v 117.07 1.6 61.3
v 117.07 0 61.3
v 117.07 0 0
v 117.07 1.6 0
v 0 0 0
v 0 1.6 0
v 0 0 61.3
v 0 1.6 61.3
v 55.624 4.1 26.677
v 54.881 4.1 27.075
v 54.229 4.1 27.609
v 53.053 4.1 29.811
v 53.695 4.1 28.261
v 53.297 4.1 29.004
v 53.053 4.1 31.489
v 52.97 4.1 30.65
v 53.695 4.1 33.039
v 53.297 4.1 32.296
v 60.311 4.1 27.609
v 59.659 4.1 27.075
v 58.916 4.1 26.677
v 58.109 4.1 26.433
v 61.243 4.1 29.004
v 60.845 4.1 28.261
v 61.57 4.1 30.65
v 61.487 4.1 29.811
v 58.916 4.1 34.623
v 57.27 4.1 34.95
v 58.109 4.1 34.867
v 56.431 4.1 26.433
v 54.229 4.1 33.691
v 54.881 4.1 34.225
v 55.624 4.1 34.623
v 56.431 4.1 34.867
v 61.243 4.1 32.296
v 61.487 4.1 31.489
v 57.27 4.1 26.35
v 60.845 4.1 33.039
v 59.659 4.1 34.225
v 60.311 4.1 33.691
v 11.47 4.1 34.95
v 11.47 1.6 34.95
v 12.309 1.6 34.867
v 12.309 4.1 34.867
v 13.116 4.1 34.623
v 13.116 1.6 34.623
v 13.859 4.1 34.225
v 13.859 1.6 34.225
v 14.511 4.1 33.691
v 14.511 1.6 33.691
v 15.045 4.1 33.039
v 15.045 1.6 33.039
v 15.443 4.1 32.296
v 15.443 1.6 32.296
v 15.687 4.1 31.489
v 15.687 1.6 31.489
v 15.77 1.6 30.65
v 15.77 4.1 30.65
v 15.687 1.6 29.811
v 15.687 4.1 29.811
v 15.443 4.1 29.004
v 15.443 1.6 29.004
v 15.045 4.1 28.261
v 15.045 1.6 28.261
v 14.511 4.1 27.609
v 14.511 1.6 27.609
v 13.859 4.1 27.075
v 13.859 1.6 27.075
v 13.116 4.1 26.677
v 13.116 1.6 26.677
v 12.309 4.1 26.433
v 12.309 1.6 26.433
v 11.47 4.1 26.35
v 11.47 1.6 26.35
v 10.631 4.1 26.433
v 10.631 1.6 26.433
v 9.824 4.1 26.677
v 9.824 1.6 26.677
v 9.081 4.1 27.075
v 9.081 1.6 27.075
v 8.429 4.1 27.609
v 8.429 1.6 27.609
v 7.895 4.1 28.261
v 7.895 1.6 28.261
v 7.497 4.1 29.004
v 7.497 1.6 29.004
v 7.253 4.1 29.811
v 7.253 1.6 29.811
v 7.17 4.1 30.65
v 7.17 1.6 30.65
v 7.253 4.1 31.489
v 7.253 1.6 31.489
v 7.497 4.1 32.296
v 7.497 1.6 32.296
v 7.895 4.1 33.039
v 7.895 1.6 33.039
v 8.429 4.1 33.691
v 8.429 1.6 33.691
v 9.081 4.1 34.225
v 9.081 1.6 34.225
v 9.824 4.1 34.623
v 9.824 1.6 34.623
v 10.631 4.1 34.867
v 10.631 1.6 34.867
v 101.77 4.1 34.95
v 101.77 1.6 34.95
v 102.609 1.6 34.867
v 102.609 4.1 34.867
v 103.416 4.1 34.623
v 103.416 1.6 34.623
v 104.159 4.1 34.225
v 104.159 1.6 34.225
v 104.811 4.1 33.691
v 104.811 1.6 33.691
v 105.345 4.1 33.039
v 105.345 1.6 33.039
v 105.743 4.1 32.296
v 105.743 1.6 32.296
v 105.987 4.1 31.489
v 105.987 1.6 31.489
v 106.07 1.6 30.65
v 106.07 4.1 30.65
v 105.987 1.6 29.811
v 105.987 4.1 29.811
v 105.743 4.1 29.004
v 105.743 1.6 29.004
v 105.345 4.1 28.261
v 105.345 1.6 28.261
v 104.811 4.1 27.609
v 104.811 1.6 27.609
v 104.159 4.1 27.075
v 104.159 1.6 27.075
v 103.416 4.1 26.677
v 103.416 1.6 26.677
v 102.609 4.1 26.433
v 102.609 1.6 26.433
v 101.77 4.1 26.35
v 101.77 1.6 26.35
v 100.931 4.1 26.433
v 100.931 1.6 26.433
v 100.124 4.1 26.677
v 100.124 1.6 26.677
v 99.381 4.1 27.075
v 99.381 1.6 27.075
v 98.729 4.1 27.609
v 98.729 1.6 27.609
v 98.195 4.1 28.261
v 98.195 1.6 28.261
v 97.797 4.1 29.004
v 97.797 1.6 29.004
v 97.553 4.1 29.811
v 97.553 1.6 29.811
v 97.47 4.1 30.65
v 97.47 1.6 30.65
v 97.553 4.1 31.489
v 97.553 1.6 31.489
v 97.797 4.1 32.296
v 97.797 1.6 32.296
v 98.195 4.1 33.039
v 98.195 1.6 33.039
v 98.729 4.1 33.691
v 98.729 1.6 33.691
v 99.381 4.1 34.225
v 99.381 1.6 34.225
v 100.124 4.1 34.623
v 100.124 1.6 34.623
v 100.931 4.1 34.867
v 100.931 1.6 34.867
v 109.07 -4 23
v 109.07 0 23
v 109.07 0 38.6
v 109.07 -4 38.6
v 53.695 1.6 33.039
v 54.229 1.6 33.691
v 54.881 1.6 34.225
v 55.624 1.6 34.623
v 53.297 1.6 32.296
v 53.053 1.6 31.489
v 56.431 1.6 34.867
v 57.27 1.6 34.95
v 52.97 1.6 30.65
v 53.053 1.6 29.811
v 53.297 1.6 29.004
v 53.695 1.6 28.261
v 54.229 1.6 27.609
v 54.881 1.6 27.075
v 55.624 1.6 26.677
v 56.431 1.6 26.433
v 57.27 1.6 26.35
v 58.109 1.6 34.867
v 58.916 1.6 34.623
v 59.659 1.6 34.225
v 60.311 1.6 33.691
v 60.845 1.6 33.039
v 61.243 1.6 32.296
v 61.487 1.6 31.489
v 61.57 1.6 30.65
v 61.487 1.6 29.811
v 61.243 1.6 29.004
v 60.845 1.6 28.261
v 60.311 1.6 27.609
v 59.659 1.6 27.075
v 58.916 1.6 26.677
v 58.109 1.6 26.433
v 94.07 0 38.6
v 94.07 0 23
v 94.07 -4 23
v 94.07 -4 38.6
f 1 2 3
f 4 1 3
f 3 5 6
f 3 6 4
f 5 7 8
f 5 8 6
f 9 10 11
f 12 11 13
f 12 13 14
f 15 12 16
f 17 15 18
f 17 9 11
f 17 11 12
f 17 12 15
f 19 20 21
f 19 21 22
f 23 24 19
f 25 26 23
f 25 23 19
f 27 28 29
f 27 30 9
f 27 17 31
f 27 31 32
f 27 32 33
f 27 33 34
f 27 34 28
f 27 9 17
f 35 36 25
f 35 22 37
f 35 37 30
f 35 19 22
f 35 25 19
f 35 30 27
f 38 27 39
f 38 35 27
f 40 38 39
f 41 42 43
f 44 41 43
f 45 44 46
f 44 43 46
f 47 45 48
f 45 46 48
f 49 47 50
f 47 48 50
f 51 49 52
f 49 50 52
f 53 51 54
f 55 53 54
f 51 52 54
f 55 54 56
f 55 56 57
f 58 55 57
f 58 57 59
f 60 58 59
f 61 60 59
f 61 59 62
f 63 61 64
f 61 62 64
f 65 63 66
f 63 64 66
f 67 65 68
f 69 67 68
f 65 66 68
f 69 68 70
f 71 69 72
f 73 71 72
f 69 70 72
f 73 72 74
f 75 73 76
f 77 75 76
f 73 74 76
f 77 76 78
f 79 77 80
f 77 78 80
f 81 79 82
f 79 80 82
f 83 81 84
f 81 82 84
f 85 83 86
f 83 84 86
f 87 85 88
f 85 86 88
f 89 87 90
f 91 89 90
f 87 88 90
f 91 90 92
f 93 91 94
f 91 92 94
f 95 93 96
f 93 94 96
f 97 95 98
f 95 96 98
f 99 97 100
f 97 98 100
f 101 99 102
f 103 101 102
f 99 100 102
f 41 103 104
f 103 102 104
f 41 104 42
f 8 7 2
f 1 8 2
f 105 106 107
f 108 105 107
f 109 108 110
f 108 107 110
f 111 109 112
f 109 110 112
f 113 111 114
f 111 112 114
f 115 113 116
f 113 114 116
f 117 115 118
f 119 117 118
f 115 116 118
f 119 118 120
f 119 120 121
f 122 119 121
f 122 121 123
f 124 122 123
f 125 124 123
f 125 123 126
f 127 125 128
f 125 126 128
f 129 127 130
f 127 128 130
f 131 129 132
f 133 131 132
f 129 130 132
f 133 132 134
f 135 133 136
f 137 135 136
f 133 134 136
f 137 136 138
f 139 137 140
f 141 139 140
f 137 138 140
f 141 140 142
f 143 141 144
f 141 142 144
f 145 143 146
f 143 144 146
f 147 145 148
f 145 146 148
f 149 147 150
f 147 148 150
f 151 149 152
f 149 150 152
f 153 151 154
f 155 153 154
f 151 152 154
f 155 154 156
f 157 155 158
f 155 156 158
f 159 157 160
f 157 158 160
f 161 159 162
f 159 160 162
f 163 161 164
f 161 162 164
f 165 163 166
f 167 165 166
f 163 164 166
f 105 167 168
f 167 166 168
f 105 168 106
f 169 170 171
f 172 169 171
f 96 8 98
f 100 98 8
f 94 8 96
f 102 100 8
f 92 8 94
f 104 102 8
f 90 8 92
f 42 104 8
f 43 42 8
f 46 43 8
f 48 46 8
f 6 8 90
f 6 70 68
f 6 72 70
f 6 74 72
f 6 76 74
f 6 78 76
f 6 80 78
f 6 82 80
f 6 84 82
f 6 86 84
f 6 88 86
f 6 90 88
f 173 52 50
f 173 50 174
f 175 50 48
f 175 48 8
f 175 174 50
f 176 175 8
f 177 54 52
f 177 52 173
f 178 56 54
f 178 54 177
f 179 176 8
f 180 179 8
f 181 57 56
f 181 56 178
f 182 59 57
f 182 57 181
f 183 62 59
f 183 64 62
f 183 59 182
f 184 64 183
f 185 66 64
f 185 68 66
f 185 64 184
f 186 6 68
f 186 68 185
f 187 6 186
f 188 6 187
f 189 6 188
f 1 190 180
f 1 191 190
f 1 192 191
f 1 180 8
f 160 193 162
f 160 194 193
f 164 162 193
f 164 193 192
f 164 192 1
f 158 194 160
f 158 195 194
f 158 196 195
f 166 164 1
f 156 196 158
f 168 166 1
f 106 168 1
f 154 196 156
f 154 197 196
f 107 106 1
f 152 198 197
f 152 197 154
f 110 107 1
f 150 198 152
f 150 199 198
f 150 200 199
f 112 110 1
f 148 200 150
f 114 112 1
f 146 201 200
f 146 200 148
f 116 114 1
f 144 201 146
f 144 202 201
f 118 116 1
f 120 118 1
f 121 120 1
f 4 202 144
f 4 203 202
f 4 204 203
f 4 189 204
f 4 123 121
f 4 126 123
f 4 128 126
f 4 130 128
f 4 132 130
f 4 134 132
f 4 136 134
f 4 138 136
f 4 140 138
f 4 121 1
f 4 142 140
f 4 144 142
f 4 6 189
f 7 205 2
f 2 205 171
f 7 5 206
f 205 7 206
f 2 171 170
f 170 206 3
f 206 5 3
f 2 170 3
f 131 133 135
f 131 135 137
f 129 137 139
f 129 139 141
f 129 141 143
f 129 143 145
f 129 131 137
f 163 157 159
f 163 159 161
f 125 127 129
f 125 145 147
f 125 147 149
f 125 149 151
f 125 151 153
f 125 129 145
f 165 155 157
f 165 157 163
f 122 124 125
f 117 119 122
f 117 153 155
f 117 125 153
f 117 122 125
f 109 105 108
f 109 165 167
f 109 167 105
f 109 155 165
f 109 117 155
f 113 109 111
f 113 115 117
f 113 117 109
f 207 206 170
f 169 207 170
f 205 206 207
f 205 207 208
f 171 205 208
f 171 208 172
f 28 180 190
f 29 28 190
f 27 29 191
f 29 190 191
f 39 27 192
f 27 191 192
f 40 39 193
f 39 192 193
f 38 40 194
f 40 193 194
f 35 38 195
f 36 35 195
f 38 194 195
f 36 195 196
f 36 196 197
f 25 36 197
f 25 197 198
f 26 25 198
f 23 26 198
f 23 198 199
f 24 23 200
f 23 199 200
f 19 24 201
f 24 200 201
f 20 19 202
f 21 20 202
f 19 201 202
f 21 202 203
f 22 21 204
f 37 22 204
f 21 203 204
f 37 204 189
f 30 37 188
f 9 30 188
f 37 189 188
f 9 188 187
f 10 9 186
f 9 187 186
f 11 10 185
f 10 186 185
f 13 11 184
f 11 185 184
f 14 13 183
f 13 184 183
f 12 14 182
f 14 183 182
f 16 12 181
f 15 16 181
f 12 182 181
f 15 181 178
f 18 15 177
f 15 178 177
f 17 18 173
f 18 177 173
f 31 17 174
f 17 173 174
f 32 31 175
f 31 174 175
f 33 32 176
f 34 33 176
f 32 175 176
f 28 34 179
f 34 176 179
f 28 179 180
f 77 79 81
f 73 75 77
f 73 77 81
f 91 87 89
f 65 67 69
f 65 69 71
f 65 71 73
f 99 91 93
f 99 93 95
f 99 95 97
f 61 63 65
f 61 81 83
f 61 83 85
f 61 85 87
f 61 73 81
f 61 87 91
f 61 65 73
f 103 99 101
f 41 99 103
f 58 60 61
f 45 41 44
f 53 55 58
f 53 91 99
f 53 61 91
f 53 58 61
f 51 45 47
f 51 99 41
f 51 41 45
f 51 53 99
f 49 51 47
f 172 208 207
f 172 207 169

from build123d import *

# Parameters (mm, degrees)
ESQUISSE1_W        = 117.07
ESQUISSE1_H        = 61.3
BOSS_EXTRU_1_DEPTH = 1.6
ESQUISSE2_W        = 15
ESQUISSE2_H        = 15.6
BOSS_EXTRU_2_DEPTH = 4
ESQUISSE3_R        = 4.3
BOSS_EXTRU_3_DEPTH = 2.5


with BuildPart() as part:
    # Esquisse1 → Boss.-Extru.1 (new body)
    with BuildSketch(Plane(origin=(0, 0, 0), x_dir=(1, 0, 0), z_dir=(0, 1, 0))):
        with Locations((58.535, -30.65)):
            Rectangle(ESQUISSE1_W, ESQUISSE1_H)
    extrude(amount=BOSS_EXTRU_1_DEPTH)

    # Esquisse2 → Boss.-Extru.2 (add)
    with BuildSketch(Plane.XZ):
        with Locations((101.57, 30.8)):
            Rectangle(ESQUISSE2_W, ESQUISSE2_H)
    extrude(amount=BOSS_EXTRU_2_DEPTH)

    # Esquisse3 → Boss.-Extru.3 (add)
    with BuildSketch(Plane(origin=(0, 1.6, 0), x_dir=(1, 0, 0), z_dir=(0, 1, 0))):
        with Locations(Location((101.77, -30.65, 0), (0, 0, 270))):
            Circle(ESQUISSE3_R)
        with Locations(Location((57.27, -30.65, 0), (0, 0, 270))):
            Circle(ESQUISSE3_R)
        with Locations(Location((11.47, -30.65, 0), (0, 0, 270))):
            Circle(ESQUISSE3_R)
    extrude(amount=BOSS_EXTRU_3_DEPTH)


solid = part.part
